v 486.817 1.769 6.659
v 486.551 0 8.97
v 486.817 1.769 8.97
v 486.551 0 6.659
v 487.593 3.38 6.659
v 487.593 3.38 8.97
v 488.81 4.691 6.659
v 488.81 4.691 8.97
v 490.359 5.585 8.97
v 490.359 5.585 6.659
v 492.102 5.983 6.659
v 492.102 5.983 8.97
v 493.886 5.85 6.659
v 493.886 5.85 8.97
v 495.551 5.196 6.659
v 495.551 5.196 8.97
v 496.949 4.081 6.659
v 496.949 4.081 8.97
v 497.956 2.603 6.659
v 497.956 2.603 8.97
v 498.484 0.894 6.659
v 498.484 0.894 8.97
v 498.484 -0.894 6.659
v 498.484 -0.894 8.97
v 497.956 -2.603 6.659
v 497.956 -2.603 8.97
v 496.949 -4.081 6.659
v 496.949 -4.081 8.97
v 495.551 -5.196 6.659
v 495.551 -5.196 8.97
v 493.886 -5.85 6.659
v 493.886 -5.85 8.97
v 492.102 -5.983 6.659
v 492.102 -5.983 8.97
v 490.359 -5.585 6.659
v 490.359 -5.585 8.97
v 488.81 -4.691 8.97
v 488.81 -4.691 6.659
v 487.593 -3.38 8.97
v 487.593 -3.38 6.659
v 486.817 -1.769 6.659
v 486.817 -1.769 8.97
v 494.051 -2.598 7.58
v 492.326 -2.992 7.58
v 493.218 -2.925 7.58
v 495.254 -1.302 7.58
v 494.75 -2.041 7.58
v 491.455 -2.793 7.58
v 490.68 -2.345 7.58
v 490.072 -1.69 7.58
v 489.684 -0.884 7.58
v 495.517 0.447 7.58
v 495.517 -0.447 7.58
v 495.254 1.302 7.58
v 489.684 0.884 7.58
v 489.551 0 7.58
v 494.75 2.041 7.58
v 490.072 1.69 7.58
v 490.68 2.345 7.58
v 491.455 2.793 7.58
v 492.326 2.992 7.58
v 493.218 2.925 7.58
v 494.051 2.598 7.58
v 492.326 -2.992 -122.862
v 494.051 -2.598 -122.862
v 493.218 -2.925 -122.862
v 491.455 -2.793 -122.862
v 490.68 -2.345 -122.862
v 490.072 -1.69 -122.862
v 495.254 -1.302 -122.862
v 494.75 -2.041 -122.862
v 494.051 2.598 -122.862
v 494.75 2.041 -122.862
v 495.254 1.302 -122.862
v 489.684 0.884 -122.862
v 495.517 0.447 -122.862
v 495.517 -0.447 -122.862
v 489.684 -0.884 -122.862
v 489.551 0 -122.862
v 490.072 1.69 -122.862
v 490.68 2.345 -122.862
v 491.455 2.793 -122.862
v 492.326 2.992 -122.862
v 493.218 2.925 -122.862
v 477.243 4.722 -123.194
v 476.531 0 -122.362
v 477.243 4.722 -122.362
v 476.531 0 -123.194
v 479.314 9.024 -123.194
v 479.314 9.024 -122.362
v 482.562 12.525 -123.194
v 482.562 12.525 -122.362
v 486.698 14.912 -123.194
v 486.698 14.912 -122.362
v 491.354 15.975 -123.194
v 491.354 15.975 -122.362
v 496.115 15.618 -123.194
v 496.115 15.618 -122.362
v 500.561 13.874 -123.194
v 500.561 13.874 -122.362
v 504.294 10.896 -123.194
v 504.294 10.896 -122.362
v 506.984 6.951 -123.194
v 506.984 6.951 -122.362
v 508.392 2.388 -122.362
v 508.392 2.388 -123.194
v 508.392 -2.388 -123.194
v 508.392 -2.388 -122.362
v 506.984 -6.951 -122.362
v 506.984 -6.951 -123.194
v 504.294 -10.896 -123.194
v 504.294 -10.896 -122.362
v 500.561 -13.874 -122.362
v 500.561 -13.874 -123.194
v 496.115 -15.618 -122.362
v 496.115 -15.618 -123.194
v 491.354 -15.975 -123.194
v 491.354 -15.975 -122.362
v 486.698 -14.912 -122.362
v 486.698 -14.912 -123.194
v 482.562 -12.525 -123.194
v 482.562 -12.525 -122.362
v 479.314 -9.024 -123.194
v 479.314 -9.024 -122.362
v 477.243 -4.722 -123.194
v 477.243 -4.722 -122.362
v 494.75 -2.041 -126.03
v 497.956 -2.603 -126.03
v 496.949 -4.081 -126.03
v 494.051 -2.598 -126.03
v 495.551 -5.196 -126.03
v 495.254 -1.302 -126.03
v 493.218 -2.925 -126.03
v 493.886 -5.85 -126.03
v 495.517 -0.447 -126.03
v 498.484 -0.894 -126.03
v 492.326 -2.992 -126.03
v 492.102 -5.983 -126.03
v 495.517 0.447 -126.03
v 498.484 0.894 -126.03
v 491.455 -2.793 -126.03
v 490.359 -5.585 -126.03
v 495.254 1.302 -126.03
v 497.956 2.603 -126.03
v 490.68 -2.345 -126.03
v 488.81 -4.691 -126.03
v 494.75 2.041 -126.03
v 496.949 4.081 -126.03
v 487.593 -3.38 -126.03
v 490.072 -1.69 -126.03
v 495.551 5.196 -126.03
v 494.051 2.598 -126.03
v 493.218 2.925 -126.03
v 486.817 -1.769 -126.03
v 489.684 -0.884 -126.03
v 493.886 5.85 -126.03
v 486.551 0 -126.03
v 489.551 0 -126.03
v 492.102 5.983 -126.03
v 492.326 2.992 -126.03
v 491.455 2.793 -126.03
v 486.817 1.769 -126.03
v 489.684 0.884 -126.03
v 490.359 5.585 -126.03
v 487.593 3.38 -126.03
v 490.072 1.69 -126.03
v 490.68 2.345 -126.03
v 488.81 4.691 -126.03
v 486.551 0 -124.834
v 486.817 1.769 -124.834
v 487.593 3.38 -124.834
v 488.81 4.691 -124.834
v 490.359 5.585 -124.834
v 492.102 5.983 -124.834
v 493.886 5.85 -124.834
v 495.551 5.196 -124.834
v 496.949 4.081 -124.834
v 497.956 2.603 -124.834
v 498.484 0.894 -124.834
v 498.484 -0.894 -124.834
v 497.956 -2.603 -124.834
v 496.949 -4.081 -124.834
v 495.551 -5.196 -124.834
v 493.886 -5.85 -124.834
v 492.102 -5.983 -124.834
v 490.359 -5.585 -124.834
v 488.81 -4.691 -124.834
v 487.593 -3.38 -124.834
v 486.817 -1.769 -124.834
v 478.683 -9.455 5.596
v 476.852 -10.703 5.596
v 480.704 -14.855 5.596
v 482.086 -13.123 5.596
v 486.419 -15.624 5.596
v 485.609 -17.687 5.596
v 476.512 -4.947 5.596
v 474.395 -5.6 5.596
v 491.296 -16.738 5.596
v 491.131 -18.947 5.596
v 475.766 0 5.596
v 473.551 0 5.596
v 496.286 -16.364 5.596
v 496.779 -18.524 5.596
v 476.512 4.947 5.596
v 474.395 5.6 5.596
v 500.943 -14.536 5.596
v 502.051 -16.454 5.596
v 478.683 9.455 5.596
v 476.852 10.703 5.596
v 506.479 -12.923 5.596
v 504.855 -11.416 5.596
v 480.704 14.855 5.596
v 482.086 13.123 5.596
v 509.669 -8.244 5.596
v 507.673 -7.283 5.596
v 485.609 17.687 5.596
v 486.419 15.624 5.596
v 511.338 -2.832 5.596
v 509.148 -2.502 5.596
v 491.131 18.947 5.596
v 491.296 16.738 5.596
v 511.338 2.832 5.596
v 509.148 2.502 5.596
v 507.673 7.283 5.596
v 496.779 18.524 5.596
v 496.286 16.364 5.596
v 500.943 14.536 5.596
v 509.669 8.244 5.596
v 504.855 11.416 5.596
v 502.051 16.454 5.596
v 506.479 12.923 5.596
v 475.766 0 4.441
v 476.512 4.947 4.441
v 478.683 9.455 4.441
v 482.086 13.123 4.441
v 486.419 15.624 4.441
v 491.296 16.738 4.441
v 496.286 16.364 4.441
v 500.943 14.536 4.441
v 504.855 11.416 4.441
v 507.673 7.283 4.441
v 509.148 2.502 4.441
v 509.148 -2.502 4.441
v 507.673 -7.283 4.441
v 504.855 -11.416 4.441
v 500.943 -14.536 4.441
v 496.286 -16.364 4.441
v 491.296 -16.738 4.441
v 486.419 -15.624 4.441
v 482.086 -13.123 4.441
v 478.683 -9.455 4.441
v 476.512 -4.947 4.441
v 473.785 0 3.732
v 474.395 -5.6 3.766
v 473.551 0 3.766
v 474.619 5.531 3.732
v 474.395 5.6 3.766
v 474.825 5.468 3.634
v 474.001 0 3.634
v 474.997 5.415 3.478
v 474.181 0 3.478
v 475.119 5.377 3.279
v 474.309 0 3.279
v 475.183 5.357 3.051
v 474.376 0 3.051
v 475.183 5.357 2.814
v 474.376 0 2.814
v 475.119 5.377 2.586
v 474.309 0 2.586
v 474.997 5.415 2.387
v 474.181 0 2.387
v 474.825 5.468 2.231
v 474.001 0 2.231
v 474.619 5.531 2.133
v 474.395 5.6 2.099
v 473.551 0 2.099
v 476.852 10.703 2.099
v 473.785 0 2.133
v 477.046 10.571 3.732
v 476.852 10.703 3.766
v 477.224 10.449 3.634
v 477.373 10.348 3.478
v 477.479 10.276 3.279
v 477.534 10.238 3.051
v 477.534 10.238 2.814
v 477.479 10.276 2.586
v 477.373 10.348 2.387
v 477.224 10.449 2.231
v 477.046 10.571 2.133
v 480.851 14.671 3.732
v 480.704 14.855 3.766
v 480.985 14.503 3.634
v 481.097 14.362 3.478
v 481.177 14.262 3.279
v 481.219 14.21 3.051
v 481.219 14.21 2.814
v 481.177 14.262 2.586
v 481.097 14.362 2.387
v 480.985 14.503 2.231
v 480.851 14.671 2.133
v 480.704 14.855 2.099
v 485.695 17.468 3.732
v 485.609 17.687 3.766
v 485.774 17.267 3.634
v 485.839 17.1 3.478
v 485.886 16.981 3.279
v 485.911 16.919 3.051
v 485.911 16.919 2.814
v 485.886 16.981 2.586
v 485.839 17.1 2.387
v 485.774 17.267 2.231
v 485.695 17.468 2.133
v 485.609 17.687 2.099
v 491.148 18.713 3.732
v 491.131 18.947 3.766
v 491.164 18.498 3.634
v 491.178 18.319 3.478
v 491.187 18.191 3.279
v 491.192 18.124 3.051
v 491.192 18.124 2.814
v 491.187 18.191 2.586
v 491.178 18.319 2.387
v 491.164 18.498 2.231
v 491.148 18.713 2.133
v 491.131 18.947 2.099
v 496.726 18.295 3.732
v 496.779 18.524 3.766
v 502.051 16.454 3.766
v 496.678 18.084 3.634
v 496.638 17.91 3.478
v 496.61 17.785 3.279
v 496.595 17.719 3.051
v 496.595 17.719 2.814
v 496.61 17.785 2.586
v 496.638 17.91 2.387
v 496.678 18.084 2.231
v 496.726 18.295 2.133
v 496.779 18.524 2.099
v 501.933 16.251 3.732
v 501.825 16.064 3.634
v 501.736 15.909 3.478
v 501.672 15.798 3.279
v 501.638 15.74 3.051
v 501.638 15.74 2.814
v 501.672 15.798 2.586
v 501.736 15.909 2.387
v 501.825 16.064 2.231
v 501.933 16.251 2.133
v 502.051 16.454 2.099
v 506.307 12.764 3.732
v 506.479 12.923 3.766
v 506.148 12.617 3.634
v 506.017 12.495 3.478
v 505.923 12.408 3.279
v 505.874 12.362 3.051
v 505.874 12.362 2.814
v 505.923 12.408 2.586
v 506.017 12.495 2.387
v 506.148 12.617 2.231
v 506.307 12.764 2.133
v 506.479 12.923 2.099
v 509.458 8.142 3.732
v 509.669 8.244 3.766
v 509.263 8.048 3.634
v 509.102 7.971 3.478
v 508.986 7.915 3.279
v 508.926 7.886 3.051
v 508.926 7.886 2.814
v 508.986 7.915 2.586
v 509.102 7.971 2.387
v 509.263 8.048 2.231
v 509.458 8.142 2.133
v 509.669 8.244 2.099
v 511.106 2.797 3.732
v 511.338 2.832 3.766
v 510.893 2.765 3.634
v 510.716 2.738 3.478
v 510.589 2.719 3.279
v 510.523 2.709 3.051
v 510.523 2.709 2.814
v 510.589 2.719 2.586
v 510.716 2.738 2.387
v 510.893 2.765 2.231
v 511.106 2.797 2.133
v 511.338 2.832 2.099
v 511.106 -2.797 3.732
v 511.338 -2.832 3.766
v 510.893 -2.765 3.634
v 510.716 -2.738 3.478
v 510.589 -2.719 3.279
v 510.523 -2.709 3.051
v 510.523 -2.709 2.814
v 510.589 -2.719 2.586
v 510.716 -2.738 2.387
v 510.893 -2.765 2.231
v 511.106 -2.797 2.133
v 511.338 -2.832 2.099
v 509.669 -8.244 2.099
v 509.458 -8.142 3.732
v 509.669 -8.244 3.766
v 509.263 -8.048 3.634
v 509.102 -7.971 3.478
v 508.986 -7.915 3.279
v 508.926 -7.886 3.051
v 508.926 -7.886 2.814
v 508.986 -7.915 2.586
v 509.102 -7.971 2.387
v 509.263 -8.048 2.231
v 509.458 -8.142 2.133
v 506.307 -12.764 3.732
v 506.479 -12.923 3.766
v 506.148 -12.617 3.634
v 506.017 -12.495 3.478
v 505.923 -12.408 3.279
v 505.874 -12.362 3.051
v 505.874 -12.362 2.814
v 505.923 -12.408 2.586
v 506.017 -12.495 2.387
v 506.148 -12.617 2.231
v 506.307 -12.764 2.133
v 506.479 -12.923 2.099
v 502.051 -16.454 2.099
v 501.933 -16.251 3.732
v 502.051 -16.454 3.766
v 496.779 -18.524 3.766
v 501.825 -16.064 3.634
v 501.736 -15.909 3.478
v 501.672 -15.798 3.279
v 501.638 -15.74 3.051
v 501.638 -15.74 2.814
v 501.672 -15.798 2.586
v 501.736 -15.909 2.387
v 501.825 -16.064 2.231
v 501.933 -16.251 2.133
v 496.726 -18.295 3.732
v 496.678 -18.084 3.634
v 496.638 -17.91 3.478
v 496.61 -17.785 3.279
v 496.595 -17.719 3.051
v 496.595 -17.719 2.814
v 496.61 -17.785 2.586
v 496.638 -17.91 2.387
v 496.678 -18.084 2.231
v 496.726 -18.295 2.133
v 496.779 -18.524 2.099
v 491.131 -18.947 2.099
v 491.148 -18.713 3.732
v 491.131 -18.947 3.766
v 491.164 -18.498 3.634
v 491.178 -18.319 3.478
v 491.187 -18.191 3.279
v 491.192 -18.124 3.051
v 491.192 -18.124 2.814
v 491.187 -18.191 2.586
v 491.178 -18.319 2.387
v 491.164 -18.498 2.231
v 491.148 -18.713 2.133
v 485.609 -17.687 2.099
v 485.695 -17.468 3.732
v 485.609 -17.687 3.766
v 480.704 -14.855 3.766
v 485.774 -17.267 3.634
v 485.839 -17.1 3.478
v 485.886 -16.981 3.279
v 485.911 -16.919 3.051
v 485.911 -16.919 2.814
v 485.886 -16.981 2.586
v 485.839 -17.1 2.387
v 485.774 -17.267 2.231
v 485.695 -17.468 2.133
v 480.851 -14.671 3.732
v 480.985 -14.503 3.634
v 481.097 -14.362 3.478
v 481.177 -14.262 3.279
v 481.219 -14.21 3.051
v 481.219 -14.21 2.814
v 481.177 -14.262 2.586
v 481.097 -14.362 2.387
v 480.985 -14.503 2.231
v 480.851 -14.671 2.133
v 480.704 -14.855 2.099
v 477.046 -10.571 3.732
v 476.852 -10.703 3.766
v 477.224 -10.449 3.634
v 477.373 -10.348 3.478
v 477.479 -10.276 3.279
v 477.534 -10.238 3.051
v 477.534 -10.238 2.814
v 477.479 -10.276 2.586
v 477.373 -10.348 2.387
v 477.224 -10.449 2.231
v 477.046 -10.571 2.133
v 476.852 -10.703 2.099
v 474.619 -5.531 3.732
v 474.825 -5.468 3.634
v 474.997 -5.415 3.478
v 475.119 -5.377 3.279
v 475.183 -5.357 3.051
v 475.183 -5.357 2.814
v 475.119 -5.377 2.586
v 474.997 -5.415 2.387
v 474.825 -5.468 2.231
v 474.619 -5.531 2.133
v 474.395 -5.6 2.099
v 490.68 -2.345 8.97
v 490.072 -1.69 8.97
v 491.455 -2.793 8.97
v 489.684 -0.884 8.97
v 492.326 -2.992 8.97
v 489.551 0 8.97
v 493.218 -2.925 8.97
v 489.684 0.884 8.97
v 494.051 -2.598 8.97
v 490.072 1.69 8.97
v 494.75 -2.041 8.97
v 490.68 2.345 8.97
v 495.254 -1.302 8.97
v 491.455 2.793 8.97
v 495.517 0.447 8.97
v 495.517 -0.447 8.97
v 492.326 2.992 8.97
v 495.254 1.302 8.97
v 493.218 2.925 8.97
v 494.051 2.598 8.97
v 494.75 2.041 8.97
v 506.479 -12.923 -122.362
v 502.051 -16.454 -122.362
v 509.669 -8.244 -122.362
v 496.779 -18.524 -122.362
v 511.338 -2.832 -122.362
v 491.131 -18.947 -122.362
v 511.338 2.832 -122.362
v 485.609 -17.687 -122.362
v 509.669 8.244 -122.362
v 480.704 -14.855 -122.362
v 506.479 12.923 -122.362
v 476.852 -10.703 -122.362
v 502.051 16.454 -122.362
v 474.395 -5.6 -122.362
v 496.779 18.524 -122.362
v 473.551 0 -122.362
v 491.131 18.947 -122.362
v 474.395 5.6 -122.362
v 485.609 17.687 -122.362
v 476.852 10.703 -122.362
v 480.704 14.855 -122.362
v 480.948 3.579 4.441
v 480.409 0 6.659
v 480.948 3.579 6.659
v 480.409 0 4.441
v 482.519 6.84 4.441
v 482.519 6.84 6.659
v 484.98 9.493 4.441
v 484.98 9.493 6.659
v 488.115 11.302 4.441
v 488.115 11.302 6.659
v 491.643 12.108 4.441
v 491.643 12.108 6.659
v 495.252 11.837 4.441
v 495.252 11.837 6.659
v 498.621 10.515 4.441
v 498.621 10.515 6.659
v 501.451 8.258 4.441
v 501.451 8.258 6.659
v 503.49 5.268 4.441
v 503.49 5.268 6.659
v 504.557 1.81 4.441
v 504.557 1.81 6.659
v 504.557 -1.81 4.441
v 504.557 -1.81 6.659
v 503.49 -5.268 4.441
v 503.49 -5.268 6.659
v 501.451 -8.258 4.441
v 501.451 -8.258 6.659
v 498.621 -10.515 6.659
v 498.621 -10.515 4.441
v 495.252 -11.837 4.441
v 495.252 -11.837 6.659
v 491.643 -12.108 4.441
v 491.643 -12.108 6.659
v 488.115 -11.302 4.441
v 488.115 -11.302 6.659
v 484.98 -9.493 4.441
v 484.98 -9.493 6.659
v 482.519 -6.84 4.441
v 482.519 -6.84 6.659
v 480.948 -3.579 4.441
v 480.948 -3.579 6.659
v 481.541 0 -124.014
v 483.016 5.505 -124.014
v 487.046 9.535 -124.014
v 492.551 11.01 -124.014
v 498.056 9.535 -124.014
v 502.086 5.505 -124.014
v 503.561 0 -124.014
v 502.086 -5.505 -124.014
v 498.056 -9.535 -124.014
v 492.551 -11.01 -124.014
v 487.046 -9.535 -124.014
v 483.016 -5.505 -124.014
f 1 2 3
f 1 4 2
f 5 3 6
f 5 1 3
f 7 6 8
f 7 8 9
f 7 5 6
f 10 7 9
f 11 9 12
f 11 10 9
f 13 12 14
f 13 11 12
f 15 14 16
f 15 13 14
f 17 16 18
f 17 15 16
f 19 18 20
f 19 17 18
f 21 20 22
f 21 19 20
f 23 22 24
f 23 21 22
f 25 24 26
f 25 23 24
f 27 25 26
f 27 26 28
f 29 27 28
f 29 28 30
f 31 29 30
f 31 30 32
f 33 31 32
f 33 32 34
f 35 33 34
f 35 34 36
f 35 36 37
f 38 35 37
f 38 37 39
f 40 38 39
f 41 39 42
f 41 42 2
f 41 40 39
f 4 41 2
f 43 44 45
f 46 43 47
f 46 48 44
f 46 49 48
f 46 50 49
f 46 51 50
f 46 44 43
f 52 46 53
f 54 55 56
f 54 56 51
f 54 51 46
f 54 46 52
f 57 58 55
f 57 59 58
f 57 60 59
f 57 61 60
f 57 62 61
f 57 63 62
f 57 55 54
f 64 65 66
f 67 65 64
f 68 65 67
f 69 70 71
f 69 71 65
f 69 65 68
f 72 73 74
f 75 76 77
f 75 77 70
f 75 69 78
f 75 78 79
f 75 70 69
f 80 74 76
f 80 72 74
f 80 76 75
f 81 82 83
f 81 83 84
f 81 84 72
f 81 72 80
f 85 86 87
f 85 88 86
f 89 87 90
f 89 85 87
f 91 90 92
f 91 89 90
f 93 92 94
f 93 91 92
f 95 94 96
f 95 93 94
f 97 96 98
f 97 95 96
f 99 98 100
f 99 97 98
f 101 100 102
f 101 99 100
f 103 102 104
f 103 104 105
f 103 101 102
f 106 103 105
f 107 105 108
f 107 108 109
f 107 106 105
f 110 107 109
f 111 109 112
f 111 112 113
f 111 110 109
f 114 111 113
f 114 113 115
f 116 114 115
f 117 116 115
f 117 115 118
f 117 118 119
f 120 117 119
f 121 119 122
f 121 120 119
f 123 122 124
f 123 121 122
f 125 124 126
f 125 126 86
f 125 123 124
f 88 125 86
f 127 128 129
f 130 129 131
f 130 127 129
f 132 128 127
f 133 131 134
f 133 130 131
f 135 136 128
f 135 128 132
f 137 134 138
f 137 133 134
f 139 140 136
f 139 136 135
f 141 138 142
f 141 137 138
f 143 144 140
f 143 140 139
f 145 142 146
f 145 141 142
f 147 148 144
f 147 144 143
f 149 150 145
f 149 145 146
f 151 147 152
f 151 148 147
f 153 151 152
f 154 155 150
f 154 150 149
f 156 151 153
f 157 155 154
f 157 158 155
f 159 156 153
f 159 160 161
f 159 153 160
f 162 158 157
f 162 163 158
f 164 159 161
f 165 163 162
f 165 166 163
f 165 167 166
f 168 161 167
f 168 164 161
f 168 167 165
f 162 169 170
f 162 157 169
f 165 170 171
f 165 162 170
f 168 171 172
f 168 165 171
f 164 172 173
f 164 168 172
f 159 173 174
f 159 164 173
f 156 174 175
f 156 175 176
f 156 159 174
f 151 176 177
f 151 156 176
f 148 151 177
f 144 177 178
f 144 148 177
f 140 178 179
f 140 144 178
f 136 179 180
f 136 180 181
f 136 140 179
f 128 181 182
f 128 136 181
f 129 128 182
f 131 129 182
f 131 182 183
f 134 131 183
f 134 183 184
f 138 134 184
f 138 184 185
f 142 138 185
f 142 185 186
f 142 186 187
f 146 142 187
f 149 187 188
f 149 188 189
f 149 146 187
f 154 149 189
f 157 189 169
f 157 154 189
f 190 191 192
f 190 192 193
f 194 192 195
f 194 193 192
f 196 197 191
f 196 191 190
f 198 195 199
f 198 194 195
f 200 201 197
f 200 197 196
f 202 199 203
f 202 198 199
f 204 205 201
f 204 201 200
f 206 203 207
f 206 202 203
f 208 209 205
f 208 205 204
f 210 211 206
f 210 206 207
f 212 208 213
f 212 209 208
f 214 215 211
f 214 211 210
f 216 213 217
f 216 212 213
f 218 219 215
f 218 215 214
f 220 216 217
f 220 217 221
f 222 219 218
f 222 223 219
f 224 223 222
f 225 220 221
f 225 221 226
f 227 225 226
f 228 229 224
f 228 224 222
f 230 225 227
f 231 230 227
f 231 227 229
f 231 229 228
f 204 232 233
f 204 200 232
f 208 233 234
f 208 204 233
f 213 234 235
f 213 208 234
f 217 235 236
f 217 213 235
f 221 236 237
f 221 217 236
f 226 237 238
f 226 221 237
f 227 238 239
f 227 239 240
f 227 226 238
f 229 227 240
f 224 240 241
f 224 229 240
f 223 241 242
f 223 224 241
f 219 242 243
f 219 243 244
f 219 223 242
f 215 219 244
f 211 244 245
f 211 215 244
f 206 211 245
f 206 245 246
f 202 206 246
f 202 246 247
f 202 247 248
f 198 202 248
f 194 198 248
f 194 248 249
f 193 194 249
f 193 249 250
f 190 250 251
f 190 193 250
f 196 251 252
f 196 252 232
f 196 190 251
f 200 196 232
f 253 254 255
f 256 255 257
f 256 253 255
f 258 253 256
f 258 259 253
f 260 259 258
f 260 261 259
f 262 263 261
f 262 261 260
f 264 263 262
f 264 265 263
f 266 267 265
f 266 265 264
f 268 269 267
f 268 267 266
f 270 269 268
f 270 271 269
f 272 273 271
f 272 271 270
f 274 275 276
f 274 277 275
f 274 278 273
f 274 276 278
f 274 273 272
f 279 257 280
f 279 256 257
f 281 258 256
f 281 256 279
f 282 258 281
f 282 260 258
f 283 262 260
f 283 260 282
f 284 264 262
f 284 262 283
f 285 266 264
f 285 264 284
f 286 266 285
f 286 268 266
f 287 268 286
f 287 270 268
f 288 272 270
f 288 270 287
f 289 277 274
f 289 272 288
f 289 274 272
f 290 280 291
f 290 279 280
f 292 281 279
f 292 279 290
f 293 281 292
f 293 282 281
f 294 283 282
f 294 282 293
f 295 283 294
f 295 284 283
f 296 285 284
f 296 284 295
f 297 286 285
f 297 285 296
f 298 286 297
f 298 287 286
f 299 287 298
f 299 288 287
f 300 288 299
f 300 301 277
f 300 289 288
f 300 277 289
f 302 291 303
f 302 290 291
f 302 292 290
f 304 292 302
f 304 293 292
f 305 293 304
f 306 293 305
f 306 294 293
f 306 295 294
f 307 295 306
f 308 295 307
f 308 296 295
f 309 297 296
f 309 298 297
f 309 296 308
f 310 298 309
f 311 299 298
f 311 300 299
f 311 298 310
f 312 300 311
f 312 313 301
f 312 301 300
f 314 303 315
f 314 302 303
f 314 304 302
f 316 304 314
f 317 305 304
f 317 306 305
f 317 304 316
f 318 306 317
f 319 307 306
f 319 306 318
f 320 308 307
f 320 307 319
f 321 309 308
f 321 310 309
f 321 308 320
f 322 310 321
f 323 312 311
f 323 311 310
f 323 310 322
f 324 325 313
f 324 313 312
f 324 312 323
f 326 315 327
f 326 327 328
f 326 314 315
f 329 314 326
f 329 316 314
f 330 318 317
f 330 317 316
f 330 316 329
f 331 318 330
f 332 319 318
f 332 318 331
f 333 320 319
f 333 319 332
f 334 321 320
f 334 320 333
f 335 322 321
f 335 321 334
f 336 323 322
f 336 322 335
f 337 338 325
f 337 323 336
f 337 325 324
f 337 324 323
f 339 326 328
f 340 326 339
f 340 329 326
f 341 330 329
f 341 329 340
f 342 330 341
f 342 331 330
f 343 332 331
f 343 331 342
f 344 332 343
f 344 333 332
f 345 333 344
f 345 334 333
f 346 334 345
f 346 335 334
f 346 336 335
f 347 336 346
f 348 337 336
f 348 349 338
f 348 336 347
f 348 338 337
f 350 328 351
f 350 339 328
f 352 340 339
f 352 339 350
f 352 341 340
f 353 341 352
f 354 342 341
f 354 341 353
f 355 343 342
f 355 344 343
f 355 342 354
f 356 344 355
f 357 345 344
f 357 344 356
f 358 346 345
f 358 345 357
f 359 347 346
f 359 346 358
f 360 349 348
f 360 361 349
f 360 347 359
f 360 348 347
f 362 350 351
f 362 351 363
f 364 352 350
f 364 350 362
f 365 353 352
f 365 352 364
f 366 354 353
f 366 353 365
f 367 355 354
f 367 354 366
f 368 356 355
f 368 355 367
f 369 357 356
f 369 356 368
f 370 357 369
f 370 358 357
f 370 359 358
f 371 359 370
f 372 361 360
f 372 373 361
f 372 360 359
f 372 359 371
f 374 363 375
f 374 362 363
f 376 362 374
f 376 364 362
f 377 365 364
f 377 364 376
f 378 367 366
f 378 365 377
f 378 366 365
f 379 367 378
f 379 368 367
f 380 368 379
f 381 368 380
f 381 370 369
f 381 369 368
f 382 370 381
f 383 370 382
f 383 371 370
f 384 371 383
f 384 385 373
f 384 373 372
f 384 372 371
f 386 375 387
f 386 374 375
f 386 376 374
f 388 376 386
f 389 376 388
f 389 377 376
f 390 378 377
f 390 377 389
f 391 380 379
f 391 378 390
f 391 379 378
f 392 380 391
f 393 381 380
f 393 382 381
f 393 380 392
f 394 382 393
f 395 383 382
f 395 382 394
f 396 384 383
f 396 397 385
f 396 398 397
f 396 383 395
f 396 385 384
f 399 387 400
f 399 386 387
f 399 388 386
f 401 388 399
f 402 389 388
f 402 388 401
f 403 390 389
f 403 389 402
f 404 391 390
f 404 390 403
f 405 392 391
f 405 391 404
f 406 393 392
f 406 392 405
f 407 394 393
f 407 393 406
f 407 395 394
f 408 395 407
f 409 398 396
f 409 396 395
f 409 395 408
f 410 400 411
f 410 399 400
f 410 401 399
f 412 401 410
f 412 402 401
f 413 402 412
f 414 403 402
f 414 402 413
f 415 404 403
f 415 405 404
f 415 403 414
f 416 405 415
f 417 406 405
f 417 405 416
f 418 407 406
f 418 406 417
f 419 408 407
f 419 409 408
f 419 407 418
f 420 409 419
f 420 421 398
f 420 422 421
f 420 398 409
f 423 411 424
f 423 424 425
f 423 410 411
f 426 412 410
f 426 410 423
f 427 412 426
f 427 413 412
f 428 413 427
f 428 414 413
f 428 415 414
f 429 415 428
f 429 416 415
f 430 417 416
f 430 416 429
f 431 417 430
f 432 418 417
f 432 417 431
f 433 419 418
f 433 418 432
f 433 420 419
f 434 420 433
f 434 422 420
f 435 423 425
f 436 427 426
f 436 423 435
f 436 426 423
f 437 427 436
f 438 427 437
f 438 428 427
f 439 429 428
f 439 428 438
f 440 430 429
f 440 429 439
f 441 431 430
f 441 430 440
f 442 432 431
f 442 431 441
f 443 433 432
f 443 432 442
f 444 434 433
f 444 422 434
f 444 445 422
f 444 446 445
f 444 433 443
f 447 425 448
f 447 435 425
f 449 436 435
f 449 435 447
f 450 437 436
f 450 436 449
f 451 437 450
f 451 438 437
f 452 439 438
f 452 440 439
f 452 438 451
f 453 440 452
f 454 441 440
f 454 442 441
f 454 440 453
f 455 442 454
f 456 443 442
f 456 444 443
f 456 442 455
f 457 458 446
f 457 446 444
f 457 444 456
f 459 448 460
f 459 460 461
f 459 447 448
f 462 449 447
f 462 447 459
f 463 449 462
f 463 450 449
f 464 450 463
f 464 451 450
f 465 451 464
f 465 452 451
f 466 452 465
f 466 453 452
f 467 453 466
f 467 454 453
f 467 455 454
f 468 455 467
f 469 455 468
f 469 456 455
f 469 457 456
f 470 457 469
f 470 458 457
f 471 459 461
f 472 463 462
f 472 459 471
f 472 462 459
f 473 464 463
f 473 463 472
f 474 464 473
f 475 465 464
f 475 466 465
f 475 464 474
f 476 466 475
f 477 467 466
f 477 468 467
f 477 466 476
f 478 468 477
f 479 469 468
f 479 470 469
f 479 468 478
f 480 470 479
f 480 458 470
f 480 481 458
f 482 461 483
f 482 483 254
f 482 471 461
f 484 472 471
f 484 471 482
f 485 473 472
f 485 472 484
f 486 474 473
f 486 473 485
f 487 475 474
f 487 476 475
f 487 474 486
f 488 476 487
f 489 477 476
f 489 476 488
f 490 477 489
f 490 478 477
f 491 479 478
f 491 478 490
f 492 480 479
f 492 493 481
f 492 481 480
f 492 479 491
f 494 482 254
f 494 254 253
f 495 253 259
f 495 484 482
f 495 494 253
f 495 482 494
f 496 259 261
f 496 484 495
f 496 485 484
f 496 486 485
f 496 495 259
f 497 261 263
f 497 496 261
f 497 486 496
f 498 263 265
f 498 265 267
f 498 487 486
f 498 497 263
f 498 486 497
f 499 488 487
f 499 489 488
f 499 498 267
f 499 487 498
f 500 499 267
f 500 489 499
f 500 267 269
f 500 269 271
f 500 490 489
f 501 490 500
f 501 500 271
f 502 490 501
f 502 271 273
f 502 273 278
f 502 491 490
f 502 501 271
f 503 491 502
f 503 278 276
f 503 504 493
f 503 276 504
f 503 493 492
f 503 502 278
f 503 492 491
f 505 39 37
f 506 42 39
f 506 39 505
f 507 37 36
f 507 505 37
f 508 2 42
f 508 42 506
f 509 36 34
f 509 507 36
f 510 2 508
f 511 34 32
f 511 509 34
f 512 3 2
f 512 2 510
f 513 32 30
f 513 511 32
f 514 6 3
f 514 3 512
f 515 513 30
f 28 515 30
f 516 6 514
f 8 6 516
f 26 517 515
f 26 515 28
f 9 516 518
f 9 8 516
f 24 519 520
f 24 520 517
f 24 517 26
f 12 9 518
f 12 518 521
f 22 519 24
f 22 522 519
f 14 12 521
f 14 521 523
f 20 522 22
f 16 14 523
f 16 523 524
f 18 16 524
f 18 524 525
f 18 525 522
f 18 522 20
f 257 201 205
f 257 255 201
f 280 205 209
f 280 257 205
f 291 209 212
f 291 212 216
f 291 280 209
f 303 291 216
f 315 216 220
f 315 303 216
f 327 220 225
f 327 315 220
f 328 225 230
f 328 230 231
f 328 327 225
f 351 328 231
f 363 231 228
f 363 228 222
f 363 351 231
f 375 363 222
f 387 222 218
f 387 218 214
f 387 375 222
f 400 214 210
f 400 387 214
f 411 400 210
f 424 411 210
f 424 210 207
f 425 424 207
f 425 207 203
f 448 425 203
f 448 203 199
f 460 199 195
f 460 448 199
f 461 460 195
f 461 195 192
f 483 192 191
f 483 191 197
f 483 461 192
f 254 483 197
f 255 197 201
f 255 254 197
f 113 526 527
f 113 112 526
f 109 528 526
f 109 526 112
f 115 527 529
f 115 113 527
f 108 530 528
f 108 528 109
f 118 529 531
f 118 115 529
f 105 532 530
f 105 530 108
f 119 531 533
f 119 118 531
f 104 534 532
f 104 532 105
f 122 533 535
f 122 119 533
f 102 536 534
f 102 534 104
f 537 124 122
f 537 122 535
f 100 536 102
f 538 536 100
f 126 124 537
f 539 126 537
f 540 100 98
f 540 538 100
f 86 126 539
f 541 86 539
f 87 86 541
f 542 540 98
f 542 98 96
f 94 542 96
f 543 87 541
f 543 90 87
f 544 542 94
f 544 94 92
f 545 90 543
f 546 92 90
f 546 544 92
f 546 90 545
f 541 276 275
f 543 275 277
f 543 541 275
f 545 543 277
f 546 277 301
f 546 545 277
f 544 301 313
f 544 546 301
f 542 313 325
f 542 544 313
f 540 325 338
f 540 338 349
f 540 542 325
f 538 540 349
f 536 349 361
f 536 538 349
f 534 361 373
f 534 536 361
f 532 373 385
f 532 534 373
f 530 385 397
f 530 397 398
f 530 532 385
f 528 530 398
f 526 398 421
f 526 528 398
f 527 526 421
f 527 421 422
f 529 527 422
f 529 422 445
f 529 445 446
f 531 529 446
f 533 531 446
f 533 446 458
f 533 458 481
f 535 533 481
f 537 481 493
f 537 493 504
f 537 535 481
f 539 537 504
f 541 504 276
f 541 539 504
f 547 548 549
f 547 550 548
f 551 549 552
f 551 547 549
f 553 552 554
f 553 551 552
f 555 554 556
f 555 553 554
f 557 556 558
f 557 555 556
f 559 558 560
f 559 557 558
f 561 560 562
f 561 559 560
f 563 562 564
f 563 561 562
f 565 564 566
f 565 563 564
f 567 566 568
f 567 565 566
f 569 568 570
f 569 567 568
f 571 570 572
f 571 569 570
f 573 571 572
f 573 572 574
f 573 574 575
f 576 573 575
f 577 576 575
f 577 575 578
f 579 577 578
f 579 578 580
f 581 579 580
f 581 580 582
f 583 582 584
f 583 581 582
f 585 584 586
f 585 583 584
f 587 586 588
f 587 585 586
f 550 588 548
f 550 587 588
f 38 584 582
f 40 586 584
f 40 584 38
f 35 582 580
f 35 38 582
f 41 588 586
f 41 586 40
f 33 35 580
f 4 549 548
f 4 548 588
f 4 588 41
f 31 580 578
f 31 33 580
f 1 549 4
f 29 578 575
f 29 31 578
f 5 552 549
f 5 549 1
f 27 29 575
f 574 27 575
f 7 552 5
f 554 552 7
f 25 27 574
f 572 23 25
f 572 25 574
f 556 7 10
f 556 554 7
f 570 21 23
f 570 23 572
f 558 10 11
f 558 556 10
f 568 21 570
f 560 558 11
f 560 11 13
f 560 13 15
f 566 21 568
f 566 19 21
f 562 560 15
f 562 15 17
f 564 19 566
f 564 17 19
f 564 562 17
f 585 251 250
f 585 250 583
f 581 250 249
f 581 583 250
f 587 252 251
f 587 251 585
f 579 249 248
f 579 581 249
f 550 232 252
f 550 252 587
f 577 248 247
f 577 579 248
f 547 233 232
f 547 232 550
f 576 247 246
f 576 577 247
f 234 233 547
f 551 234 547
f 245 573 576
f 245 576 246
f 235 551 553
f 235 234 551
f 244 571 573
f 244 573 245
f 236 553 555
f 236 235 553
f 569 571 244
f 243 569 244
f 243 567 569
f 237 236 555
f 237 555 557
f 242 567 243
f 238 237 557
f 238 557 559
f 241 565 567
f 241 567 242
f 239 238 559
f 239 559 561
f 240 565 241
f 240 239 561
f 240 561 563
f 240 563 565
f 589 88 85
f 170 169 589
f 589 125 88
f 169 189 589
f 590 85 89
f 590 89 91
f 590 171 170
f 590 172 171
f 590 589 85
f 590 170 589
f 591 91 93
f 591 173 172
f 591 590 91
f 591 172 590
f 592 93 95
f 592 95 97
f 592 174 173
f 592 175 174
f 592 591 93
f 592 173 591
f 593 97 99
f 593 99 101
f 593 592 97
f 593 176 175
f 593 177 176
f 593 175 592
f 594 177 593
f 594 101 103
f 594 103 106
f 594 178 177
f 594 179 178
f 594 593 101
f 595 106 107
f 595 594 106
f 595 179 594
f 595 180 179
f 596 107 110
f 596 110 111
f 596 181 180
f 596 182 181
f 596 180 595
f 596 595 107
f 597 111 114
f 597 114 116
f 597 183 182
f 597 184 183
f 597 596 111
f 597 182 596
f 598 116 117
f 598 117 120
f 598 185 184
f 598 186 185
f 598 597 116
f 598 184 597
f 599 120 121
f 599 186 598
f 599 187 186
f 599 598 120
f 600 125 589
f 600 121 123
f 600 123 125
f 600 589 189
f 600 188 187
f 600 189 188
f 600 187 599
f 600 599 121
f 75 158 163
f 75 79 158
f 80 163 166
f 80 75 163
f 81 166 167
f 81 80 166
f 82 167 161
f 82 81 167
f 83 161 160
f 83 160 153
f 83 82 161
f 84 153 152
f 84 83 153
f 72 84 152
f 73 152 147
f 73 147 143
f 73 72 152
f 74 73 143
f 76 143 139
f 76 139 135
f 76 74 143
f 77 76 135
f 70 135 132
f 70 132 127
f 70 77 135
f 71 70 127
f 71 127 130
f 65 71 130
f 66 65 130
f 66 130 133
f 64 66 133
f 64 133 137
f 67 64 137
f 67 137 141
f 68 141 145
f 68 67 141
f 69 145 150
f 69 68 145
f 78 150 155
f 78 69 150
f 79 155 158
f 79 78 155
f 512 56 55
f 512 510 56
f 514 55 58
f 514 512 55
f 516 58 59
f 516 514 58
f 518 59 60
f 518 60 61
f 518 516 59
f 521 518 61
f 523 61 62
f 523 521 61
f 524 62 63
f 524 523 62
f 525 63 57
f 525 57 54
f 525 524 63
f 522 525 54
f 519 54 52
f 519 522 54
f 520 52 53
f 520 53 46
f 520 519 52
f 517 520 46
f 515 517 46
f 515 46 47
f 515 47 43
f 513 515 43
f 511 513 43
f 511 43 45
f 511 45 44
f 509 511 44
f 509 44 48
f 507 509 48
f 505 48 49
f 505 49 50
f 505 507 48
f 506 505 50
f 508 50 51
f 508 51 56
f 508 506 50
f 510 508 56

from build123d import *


with BuildPart() as f1:
    # F0 (on Front) → F1 (revolve)
    with BuildSketch(Plane.XZ):
        with BuildLine():
            Line((489.550671, 7.579802), (489.550671, 8.969648))
            Line((489.550671, 8.969648), (486.550671, 8.969648))
            Line((486.550671, 8.969648), (486.550671, 6.658985))
            Line((486.550671, 6.658985), (480.40905, 6.658985))
            Line((480.40905, 6.658985), (480.40905, 4.440768))
            Line((480.40905, 4.440768), (475.766086, 4.440768))
            Line((475.766086, 4.440768), (475.766086, 5.595956))
            Line((475.766086, 5.595956), (473.550671, 5.595956))
            Line((473.550671, 5.595956), (473.550671, 3.76596))
            ThreePointArc((473.550671, 3.76596), (474.384093, 2.932538), (473.550671, 2.099116))
            Line((473.550671, 2.099116), (473.550671, -122.362282))
            Line((473.550671, -122.362282), (476.530877, -122.362282))
            Line((476.530877, -122.362282), (476.530877, -123.194333))
            Line((476.530877, -123.194333), (486.550671, -124.833937))
            Line((486.550671, -124.833937), (486.550671, -126.030352))
            Line((486.550671, -126.030352), (489.550671, -126.030352))
            Line((489.550671, -126.030352), (489.550671, -122.861977))
            Line((489.550671, -122.861977), (492.550671, -122.861977))
            Line((492.550671, -122.861977), (492.550671, 7.579802))
            Line((492.550671, 7.579802), (489.550671, 7.579802))
        make_face()
    revolve(axis=Axis((492.550671, 0, -54.35379), (0, 0, -1)))


solid = f1.part
